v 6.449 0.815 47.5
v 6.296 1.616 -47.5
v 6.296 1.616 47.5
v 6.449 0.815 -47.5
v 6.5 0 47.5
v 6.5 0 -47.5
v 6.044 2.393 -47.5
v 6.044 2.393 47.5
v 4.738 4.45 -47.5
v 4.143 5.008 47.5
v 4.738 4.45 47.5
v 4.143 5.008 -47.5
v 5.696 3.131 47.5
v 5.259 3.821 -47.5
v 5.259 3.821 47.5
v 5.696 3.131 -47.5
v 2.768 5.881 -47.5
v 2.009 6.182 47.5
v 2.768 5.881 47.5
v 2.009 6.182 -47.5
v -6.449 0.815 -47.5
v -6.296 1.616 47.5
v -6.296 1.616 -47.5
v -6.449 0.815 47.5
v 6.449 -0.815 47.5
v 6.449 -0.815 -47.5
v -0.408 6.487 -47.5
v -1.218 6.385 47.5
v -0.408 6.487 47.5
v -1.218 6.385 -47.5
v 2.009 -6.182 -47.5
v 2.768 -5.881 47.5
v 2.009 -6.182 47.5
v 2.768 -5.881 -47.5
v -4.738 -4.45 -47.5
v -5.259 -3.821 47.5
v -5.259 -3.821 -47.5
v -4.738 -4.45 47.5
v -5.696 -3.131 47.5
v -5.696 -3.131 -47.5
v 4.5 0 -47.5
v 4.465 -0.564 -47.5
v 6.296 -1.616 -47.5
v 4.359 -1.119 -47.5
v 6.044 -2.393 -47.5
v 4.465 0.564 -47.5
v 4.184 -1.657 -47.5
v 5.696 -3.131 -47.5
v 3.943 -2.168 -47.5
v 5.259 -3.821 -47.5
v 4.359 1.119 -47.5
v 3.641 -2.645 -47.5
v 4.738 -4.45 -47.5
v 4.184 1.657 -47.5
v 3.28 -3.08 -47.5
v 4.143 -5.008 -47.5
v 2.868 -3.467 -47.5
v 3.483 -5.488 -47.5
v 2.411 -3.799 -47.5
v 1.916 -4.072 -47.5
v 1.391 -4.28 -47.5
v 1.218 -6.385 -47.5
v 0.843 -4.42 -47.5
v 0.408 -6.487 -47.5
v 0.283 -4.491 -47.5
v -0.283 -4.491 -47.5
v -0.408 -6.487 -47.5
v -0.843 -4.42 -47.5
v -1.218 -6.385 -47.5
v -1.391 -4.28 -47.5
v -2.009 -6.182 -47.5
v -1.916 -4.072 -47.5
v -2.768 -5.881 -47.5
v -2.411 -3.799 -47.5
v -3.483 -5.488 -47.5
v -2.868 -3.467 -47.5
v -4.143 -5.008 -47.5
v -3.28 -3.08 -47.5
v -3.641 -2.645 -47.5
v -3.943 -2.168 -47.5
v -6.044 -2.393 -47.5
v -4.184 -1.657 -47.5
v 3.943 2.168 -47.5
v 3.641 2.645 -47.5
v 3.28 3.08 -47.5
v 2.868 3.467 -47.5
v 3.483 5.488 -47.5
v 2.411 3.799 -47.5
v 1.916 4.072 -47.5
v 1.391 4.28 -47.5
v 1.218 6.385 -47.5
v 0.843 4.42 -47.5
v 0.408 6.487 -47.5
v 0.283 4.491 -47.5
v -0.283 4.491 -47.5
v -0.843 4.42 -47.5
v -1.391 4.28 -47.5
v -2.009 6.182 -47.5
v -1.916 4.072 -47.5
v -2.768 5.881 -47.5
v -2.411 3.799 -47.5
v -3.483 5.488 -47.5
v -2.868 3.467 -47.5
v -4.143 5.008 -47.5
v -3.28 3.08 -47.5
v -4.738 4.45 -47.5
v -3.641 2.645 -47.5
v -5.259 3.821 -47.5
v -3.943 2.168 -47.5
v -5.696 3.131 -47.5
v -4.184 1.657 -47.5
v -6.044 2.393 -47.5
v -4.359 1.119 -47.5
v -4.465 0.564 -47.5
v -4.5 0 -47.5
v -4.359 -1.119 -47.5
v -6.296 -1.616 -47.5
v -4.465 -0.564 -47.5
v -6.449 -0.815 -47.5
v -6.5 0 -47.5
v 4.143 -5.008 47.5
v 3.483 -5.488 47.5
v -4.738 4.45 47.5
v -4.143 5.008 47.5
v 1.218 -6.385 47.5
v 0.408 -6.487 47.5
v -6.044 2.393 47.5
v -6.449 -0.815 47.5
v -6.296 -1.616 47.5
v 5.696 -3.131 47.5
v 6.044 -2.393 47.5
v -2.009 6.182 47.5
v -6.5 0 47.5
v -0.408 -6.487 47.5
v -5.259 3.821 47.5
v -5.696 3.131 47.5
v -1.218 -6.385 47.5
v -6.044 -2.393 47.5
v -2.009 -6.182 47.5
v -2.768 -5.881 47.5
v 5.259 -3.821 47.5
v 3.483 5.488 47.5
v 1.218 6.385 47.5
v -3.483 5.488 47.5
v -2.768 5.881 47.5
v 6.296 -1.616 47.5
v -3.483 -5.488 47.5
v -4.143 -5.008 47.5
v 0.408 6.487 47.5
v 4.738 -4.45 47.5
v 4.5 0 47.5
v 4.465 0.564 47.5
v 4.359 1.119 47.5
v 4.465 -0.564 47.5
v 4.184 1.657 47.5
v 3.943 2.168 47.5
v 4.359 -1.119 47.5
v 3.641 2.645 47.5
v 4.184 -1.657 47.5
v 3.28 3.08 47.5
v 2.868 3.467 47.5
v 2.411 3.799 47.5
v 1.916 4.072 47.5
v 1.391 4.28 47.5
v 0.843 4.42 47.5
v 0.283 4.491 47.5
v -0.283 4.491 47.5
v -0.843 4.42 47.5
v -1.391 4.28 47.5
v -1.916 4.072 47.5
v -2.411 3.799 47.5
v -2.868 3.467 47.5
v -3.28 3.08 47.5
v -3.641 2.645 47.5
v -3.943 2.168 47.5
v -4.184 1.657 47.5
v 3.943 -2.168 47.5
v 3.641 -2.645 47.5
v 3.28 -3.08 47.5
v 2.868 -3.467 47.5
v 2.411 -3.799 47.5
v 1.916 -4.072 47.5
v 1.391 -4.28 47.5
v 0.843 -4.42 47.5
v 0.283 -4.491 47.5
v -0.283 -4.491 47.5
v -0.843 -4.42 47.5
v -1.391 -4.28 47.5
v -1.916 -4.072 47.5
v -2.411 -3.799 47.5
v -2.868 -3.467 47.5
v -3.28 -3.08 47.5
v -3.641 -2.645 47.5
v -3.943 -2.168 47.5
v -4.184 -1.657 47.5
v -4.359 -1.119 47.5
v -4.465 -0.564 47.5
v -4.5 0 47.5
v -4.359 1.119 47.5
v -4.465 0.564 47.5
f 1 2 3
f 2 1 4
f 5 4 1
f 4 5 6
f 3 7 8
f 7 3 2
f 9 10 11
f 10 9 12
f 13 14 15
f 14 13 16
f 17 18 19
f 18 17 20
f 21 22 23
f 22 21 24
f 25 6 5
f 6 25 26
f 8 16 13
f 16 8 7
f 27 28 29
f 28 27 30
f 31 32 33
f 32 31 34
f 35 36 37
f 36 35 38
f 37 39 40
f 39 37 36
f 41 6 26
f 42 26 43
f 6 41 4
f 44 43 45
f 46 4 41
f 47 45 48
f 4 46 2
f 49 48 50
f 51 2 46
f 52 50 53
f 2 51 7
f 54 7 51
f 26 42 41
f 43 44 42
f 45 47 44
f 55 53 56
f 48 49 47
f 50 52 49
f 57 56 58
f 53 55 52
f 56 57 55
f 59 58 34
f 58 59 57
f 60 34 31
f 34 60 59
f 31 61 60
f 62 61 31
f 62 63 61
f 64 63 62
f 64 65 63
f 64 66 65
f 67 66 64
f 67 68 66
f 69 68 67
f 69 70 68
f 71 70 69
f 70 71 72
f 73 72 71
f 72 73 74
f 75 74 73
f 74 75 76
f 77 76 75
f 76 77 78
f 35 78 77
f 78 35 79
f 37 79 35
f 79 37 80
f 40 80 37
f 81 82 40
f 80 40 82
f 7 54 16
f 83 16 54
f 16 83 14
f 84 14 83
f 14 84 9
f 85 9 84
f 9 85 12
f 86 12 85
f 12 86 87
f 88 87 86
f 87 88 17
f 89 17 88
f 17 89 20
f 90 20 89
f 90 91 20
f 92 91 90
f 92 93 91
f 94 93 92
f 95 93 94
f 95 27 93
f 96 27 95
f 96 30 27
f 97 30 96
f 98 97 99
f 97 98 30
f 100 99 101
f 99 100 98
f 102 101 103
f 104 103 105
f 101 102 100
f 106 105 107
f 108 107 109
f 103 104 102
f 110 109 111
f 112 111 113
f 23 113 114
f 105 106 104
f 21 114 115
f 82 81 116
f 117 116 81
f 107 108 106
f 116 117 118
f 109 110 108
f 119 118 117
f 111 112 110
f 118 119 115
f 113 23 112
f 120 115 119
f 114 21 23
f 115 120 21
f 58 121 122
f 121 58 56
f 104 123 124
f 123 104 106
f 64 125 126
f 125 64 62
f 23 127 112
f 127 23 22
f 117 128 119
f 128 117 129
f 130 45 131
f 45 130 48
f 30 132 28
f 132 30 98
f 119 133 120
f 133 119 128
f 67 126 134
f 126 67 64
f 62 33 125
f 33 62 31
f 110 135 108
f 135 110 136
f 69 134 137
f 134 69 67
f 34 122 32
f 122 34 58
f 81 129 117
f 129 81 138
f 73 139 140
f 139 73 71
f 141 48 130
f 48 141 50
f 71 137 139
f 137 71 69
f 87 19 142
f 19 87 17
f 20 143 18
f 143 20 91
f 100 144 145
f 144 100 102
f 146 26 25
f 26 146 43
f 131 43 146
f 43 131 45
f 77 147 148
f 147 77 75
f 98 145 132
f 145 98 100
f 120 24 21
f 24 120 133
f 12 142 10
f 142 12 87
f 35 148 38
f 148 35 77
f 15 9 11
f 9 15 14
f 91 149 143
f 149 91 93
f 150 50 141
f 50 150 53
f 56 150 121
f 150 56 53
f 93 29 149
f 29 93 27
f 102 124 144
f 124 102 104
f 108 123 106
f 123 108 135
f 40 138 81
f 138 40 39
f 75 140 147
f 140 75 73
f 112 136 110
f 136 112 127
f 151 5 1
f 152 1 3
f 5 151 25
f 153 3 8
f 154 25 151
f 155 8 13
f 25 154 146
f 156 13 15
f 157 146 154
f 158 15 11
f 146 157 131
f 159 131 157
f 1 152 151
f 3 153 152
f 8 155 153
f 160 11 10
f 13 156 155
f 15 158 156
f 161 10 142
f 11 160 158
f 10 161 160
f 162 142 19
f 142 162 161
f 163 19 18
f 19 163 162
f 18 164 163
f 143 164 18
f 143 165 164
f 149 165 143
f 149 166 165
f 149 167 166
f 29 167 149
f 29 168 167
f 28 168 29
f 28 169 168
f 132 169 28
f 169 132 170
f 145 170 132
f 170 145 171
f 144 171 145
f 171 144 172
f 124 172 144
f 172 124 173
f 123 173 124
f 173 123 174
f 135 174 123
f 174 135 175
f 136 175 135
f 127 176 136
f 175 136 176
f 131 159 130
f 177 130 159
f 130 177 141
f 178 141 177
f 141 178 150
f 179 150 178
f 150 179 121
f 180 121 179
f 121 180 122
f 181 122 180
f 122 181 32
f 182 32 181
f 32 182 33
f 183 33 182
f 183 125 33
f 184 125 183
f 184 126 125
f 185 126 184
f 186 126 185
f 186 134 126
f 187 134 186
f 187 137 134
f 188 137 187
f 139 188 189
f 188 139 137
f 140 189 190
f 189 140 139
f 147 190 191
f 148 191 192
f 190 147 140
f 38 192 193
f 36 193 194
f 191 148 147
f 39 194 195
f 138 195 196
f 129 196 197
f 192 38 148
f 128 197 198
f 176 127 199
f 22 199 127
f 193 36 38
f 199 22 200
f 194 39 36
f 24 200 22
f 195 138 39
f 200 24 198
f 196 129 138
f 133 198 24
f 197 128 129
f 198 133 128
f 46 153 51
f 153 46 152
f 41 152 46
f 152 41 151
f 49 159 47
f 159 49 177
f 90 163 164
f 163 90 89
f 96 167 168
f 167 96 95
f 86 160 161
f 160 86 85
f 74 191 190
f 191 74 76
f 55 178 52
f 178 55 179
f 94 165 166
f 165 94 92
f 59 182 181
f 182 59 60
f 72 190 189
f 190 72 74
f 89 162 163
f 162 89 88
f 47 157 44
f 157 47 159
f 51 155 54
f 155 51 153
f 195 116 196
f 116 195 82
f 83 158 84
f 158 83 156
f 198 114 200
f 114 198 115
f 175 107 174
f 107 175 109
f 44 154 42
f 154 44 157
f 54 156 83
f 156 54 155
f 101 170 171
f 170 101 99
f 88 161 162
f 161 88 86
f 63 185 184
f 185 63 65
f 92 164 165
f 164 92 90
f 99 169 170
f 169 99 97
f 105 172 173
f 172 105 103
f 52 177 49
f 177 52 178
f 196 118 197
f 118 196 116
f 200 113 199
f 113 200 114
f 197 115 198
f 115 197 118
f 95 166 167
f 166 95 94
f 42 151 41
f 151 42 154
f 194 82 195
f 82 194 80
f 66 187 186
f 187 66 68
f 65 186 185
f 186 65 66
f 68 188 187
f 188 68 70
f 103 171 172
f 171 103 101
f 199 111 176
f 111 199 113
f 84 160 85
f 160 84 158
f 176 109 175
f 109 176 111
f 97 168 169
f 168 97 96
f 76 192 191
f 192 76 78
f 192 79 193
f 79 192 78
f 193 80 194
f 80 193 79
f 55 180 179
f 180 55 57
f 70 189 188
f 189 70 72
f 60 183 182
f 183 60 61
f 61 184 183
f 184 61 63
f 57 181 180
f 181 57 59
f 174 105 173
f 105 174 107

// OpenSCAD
$fn = 50;


difference() {
	union() {
		translate(v = [0, 0, -47.5000000000]) {
			cylinder(h = 95, r = 6.5000000000);
		}
	}
	union() {
		translate(v = [0, 0, -100.0000000000]) {
			cylinder(h = 200, r = 4.5000000000);
		}
	}
}
